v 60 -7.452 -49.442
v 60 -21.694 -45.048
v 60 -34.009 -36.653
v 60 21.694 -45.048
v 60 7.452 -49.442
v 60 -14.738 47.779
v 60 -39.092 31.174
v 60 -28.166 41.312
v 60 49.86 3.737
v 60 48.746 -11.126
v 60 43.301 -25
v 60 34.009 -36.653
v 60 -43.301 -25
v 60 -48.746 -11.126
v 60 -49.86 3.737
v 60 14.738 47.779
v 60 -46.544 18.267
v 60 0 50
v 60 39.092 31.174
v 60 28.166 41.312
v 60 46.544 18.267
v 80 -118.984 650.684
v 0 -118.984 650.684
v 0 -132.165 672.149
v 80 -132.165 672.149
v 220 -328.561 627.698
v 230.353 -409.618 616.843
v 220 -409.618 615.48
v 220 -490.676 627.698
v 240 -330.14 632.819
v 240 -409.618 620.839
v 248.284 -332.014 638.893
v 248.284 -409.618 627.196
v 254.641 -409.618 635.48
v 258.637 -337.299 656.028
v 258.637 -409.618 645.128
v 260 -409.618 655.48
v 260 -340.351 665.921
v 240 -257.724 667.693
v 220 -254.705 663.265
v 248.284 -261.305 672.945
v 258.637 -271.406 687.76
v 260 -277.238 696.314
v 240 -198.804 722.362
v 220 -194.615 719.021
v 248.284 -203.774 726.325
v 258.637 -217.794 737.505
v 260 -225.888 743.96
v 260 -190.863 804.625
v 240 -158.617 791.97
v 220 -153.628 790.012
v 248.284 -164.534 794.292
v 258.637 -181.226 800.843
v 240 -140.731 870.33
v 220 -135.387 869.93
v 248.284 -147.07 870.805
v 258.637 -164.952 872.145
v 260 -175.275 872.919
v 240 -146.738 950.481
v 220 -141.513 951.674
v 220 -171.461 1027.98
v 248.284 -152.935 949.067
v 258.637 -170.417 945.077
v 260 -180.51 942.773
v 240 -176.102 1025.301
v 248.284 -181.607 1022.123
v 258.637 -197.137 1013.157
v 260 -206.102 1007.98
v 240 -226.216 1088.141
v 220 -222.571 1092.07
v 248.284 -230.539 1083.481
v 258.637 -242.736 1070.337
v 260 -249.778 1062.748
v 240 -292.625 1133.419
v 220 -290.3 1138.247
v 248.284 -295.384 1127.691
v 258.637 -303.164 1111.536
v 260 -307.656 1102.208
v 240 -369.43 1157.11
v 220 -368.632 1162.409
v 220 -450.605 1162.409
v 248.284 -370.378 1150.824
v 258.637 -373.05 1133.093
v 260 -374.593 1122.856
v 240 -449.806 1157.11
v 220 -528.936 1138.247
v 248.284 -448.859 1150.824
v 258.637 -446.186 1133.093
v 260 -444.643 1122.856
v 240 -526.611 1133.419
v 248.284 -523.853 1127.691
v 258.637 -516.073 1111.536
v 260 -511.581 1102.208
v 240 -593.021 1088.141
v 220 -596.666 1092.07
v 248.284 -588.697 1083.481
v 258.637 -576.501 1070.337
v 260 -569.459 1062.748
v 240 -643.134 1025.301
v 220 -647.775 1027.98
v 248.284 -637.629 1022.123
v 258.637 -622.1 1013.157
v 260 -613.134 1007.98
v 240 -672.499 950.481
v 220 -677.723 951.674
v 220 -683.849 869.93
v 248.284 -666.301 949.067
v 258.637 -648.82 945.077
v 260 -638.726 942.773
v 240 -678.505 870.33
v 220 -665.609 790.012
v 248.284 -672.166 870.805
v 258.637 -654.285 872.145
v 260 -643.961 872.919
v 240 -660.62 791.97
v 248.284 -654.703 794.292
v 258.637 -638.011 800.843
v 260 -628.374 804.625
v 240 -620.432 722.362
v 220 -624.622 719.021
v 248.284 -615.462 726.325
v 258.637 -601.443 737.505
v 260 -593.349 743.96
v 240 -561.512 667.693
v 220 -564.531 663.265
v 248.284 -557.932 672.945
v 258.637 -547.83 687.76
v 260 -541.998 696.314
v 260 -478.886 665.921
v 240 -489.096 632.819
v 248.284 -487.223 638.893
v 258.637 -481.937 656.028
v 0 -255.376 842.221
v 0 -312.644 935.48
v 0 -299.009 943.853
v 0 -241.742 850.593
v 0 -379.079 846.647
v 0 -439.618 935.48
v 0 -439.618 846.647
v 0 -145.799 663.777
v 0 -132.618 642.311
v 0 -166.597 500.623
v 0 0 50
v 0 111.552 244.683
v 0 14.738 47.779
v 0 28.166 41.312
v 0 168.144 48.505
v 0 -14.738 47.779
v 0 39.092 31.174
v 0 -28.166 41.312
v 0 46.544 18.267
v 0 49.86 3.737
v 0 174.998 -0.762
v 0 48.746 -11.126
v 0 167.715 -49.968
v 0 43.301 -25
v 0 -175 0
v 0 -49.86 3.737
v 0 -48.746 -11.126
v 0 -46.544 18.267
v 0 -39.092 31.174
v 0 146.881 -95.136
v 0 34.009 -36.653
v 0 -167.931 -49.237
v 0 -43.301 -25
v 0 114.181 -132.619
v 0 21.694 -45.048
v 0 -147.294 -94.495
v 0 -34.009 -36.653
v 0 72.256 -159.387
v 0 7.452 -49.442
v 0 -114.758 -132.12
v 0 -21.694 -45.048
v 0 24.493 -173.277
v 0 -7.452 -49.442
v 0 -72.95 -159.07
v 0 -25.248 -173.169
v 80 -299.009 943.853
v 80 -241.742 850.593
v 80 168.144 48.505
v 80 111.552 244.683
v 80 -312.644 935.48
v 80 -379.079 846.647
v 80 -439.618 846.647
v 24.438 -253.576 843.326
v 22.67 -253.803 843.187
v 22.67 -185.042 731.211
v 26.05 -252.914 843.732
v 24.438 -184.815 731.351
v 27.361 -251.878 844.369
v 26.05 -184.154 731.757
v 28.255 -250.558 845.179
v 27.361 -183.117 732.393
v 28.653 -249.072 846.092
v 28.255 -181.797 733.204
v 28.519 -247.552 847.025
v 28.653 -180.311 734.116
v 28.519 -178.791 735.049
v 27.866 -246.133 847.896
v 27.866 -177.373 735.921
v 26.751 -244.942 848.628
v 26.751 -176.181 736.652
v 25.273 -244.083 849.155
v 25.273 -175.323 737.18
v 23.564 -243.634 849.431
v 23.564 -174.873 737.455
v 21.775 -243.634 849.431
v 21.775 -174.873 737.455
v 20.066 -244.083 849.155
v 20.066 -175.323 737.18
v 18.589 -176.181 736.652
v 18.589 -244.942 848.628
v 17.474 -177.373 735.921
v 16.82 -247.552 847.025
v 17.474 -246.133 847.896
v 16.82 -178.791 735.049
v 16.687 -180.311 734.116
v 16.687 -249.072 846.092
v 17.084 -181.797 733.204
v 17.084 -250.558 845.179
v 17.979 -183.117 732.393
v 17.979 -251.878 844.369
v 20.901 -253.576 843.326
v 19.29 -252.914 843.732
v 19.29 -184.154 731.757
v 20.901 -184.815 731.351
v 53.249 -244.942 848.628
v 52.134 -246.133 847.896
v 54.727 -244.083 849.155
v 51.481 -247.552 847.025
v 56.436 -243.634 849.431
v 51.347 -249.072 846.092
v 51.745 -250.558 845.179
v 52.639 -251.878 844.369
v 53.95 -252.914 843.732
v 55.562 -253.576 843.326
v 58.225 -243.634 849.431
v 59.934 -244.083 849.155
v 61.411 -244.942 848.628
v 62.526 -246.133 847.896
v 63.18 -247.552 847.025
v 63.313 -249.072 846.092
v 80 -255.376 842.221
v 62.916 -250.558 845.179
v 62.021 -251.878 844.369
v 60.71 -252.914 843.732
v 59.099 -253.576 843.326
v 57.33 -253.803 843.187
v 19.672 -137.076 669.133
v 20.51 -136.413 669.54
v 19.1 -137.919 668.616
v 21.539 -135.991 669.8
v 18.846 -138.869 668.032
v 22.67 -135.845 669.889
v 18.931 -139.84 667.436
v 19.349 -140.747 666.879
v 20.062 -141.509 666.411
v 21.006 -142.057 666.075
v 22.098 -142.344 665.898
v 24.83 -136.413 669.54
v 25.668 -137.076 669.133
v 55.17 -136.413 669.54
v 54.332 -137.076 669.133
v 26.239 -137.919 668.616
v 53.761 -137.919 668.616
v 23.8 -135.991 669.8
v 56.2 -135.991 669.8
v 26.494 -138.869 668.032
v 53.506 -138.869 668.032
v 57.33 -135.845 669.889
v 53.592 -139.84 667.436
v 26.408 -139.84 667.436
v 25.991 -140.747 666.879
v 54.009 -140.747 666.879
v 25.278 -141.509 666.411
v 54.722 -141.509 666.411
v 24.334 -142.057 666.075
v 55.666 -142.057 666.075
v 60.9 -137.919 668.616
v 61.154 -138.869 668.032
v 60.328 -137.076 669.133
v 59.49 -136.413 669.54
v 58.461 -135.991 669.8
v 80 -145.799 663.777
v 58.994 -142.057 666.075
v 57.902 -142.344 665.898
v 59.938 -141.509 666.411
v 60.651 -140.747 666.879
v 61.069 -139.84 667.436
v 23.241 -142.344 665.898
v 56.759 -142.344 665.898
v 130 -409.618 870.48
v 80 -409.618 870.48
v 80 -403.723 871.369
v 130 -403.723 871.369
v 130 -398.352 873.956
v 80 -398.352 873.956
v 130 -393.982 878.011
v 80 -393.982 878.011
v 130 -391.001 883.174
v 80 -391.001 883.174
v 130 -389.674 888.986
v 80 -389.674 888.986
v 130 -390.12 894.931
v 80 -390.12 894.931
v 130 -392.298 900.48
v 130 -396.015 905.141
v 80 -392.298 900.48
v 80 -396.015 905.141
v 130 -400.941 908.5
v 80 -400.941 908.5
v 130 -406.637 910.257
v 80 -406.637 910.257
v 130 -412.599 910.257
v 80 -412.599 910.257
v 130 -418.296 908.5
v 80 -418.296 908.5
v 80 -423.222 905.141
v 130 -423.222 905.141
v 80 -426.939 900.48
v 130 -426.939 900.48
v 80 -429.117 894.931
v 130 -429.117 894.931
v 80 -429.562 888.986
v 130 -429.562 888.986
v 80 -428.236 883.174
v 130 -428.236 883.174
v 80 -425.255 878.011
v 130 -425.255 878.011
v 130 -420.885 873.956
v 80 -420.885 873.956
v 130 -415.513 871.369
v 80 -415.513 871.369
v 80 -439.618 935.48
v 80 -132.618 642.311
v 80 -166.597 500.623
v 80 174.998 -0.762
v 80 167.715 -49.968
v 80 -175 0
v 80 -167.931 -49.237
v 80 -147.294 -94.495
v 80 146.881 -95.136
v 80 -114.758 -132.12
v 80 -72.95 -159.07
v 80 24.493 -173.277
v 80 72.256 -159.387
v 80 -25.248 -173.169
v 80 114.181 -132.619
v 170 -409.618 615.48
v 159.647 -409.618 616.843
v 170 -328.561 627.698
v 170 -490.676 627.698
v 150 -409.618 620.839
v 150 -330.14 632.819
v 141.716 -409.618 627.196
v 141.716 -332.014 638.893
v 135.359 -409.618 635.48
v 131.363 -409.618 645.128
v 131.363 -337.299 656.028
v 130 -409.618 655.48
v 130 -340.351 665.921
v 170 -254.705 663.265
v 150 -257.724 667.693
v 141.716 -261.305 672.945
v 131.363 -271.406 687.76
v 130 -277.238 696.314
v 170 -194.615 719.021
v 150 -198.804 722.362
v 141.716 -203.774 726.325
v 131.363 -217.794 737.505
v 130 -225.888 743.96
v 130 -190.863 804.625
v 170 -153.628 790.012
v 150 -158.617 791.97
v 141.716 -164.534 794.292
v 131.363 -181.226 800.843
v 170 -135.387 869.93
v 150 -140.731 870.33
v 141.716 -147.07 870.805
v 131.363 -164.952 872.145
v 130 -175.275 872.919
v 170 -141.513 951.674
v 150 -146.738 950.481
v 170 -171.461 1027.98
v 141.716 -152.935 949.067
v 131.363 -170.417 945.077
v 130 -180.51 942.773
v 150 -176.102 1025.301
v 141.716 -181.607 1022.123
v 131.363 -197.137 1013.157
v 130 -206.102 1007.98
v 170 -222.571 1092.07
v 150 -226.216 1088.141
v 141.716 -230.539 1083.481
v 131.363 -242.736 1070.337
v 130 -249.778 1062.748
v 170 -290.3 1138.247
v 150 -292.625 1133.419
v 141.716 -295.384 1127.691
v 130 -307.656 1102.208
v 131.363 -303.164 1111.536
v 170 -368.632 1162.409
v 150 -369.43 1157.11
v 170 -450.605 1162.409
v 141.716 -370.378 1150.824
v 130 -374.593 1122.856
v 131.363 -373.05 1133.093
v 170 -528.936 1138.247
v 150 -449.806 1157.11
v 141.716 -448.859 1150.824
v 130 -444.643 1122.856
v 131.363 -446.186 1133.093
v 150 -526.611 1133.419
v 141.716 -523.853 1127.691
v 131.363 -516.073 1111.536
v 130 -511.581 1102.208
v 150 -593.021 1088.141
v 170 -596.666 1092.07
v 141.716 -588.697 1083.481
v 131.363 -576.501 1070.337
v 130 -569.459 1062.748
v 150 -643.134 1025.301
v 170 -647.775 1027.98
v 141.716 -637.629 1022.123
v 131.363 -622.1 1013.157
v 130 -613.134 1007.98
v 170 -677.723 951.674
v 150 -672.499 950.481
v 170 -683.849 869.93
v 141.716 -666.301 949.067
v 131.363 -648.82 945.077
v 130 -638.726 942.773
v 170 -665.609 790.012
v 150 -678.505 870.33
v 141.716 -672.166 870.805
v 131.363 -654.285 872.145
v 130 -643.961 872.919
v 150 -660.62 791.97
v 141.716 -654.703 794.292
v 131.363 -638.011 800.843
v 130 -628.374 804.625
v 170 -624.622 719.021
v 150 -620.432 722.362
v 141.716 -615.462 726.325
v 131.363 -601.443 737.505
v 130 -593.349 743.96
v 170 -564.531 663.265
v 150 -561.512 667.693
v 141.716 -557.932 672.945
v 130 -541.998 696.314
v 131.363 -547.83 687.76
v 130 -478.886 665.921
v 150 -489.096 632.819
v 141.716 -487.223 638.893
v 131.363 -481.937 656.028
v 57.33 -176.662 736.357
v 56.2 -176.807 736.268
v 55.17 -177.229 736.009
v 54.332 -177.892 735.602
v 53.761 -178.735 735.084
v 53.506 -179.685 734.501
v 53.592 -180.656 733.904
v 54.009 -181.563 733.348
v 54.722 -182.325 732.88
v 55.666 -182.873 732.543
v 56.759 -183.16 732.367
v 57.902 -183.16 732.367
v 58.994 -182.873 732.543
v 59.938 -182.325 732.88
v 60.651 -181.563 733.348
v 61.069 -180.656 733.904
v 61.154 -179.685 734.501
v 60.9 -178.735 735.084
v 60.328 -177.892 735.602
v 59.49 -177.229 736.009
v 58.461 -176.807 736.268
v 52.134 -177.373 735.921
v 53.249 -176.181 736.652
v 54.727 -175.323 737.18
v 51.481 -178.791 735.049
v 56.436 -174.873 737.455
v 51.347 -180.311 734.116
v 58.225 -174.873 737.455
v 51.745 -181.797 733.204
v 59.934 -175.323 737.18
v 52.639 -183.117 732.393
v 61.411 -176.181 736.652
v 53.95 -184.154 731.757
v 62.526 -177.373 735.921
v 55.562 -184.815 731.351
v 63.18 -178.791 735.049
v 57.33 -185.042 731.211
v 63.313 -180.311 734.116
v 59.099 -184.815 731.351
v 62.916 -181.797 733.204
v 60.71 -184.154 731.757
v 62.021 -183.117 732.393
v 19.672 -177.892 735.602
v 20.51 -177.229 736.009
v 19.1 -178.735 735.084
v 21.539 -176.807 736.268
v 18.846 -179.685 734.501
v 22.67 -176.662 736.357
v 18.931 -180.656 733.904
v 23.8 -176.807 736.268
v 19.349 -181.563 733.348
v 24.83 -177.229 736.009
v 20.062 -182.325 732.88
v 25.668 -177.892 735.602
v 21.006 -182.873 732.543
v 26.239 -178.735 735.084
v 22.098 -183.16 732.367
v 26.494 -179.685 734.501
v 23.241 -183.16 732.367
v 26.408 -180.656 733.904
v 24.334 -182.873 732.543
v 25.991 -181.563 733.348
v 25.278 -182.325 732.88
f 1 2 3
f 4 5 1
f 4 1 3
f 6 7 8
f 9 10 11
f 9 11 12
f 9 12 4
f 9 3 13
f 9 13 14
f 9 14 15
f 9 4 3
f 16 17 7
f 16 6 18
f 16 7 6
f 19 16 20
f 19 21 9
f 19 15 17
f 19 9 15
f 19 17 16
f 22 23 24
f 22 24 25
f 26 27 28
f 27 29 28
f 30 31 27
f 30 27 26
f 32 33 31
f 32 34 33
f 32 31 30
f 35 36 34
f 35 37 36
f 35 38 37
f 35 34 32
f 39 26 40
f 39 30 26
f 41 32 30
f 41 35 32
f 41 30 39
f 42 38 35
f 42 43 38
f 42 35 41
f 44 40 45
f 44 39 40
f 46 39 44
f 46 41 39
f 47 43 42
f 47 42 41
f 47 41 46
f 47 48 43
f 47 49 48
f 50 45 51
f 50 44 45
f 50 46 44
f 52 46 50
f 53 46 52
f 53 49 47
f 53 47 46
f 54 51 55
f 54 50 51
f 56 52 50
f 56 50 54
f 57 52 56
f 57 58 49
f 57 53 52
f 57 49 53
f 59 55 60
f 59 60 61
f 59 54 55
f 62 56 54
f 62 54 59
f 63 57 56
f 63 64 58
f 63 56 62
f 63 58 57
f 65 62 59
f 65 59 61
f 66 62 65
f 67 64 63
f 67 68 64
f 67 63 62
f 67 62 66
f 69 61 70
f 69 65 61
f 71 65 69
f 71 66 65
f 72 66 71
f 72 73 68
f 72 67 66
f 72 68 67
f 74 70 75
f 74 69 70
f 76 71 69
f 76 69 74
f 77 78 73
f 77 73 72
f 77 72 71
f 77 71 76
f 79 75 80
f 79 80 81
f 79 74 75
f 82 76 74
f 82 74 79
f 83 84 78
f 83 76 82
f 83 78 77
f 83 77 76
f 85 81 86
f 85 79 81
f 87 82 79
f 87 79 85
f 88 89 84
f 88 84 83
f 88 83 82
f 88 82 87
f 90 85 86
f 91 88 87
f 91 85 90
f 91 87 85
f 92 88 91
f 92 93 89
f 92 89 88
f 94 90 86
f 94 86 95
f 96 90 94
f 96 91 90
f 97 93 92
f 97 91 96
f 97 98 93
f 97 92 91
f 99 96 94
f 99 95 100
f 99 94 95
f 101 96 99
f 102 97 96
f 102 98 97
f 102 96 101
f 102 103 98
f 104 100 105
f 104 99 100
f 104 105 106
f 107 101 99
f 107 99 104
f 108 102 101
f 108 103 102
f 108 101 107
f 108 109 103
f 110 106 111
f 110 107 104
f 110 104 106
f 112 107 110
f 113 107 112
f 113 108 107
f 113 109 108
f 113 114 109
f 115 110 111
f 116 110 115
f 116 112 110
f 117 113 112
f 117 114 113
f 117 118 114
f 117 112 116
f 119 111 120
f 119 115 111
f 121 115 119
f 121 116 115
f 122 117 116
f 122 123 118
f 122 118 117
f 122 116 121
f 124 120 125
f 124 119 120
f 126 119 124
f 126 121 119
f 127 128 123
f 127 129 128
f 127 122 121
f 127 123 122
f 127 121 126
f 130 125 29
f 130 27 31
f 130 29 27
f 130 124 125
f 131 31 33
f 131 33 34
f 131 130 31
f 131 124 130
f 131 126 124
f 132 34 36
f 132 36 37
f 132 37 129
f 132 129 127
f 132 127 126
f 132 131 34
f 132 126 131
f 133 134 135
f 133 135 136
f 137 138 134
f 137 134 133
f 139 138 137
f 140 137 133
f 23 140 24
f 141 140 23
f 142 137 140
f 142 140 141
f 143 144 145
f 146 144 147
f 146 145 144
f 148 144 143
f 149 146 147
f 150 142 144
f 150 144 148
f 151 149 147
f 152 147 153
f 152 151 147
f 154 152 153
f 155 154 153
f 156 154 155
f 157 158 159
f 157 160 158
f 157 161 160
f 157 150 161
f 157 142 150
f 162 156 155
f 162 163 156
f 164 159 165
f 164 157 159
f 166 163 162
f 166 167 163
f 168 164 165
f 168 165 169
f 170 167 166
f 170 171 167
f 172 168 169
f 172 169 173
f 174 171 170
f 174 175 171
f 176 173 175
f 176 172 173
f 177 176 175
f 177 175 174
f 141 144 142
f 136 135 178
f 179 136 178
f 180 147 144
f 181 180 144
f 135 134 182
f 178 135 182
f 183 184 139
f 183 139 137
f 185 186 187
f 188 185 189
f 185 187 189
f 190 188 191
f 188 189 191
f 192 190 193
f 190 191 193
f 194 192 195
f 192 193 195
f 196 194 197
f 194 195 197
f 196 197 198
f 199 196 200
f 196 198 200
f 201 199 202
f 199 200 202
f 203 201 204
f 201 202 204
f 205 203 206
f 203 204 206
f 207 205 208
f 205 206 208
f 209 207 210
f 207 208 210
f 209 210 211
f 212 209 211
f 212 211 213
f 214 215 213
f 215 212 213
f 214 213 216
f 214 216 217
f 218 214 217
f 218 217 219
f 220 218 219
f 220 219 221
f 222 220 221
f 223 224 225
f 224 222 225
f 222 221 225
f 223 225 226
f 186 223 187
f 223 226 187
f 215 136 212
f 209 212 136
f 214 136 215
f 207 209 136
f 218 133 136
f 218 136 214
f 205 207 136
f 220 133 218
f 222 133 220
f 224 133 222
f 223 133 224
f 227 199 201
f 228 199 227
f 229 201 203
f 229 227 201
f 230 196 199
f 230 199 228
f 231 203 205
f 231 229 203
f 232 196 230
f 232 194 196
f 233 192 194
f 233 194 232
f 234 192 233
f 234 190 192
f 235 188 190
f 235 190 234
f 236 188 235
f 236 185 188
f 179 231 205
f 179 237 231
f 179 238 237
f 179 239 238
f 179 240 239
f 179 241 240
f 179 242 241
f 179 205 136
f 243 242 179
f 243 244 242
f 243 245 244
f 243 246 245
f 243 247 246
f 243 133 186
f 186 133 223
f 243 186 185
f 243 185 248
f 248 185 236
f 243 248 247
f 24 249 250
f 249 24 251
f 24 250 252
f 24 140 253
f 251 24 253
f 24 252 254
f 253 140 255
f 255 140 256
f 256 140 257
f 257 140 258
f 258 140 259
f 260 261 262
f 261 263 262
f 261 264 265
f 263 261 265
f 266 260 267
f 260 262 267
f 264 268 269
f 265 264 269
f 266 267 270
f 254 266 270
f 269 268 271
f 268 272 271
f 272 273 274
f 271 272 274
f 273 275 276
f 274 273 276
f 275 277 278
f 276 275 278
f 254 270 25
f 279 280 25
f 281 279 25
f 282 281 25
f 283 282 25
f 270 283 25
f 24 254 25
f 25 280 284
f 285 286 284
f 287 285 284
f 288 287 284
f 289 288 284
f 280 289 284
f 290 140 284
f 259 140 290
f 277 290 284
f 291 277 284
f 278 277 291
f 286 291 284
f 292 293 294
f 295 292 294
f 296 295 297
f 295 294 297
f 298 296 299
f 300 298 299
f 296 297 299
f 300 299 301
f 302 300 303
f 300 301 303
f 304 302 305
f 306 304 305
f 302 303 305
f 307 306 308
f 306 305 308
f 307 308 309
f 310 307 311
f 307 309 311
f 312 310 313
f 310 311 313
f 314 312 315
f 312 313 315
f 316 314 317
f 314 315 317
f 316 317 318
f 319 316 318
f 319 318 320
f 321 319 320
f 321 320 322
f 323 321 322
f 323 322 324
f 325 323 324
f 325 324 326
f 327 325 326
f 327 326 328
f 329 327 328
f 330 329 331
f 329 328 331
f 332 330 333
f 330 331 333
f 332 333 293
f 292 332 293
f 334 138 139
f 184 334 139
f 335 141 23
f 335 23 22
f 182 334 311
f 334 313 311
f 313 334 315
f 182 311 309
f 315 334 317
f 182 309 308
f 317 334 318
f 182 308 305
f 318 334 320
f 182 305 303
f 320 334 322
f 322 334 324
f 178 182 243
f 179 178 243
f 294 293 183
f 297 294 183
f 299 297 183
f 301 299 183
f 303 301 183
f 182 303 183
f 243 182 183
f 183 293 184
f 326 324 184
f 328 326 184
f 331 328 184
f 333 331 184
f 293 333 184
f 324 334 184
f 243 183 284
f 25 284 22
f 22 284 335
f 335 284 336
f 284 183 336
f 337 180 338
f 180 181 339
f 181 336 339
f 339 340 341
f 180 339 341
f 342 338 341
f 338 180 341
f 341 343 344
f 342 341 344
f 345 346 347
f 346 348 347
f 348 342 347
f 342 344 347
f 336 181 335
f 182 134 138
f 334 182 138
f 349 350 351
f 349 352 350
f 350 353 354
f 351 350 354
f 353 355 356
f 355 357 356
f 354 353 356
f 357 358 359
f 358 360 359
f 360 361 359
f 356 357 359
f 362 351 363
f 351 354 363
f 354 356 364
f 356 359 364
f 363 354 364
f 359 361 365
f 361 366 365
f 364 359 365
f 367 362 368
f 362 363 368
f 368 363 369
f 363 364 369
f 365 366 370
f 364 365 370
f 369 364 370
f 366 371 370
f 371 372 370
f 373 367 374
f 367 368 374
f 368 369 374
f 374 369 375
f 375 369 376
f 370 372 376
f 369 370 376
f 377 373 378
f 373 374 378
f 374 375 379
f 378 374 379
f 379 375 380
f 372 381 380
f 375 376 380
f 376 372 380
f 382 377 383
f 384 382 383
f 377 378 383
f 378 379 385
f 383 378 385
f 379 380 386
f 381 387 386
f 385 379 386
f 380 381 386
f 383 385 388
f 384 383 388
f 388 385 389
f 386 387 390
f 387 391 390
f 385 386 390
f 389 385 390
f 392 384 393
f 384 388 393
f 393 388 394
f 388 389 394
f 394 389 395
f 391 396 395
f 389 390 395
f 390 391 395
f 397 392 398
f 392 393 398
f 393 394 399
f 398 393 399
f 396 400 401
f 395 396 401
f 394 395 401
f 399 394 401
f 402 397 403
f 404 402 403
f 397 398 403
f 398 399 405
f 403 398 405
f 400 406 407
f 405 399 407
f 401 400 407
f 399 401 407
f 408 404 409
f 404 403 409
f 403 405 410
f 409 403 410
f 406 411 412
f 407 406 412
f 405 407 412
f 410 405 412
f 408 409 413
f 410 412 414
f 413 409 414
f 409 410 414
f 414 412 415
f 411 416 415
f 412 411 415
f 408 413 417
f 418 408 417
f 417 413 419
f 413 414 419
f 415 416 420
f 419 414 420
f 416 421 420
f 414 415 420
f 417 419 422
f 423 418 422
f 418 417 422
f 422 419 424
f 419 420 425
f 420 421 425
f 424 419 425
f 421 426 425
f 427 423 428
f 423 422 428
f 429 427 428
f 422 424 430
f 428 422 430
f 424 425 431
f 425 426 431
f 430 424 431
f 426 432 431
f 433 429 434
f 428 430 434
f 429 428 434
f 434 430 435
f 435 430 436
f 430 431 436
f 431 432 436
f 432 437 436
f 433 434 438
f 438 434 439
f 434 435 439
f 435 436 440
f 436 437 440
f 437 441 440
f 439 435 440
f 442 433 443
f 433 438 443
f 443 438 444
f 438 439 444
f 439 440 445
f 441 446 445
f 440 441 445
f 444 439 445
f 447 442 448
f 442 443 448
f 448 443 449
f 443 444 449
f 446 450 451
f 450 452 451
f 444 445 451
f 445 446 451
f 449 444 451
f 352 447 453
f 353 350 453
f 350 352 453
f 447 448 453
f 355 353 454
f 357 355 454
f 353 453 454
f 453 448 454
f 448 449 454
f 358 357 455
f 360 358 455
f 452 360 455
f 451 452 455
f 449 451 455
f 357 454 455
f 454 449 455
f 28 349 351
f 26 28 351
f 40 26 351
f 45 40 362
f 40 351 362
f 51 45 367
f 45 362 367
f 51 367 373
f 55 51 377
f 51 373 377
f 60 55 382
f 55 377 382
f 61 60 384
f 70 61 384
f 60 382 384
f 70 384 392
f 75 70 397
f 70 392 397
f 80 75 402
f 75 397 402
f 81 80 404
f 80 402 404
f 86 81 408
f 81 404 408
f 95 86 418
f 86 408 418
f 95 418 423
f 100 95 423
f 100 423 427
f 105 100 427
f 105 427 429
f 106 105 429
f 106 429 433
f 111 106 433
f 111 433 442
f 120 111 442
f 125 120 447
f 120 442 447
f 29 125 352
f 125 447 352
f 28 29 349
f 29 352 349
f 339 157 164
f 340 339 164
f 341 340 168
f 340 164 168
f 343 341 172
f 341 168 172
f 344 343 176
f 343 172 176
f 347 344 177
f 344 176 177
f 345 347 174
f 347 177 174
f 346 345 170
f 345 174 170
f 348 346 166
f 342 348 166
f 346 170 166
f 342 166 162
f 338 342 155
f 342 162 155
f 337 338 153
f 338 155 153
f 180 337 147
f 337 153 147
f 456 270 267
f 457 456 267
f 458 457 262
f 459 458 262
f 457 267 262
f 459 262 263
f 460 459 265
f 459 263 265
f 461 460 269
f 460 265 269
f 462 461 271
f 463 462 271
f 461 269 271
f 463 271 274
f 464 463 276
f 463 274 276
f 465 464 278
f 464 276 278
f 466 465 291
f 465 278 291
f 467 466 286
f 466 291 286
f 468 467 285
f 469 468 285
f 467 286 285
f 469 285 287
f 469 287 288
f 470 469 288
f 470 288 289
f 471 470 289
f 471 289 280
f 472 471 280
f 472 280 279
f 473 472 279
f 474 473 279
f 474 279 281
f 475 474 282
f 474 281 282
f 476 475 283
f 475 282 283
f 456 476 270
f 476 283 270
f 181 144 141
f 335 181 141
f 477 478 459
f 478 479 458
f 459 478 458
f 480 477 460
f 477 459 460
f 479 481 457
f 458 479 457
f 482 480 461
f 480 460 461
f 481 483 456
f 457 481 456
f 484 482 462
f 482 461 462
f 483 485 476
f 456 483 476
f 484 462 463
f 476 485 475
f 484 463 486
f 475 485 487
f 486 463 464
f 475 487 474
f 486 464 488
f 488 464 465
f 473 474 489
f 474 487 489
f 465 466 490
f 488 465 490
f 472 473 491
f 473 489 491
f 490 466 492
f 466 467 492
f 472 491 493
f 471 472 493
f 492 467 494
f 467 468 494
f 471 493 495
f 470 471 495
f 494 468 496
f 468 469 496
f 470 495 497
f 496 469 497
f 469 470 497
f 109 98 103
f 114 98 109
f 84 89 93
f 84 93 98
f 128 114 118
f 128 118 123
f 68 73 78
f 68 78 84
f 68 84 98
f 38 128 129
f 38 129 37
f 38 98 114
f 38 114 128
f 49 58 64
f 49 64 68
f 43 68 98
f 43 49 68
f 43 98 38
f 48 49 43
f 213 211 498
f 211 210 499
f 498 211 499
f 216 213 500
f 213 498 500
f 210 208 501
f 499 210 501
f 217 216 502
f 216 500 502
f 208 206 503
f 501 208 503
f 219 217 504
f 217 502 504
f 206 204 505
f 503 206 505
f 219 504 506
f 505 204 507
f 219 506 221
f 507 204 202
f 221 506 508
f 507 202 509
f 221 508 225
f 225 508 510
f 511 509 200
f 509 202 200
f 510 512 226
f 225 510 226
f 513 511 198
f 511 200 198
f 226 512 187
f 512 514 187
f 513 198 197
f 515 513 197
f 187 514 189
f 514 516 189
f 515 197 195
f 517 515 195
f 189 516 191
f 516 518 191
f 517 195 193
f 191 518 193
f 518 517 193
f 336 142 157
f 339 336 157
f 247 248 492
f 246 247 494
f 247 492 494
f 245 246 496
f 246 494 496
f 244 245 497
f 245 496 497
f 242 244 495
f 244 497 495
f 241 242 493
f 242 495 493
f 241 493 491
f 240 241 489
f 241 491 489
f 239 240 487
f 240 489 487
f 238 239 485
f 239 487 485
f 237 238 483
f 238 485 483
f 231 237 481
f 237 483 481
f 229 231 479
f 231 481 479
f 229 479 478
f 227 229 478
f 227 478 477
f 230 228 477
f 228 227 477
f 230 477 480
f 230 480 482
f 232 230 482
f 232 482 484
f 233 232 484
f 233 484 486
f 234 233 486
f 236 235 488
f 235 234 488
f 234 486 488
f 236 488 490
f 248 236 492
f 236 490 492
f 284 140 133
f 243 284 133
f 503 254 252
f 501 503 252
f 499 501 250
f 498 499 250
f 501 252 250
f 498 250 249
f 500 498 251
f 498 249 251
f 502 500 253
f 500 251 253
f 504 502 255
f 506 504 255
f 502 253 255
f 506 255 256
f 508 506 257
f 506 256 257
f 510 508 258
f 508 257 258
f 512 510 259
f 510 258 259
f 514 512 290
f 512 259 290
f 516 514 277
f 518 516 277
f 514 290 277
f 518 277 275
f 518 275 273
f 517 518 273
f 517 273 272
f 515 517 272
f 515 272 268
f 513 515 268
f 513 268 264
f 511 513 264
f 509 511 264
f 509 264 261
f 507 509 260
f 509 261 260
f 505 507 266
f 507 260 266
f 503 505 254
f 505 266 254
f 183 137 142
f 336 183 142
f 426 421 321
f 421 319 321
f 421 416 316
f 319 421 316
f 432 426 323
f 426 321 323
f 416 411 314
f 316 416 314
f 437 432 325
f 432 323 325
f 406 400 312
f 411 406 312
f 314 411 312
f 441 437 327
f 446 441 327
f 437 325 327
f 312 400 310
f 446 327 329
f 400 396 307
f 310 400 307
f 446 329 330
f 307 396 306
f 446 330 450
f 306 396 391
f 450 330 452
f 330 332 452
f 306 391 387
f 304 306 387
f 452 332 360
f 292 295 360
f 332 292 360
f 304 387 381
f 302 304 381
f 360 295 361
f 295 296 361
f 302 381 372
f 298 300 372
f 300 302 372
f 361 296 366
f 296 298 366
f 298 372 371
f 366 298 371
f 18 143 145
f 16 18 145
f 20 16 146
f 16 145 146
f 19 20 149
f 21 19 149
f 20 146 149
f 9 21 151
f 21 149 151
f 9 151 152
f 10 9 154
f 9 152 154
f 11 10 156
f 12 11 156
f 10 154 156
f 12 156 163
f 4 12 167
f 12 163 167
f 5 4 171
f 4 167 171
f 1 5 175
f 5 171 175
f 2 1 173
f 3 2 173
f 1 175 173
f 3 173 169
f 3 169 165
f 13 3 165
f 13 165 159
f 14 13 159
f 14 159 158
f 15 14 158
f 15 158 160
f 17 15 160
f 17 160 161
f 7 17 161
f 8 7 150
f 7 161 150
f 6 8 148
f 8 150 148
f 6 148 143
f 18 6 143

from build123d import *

# Parameters (mm, degrees)
BOSS_EXTRUDE1_DEPTH = 80
SKETCH3_R           = 50
CUT_EXTRUDE1_DEPTH  = 60
SKETCH4_W           = 80
SKETCH4_H           = 25.189285717
BOSS_EXTRUDE2_DEPTH = 16
SKETCH5_W           = 80
SKETCH5_H           = 109.43946138
BOSS_EXTRUDE3_DEPTH = 16
SKETCH6_R           = 3.834610425
BOSS_EXTRUDE4_DEPTH = 78
SKETCH7_R           = 6
BOSS_EXTRUDE5_DEPTH = 135
SKETCH9_R           = 20
BOSS_EXTRUDE6_DEPTH = 50
SKETCH10_R          = 275
BOSS_EXTRUDE7_DEPTH = 130
FILLET1_R           = 40


with BuildPart() as part:
    # Sketch1 → Boss-Extrude1 (new body)
    with BuildSketch(Plane(origin=(0, 0, 0), x_dir=(0, 0, -1), z_dir=(1, 0, 0))):
        with BuildLine():
            Line((-48.50457236, 168.143707763), (-244.683369844, 111.551826897))
            Line((-244.683369844, 111.551826897), (-935.480433622, -312.64385861))
            Line((-935.480433622, -312.64385861), (-935.480433622, -439.618269219))
            Line((-935.480433622, -439.618269219), (-846.646989911, -439.618269219))
            Line((-846.646989911, -439.618269219), (-846.646989911, -379.079220955))
            Line((-846.646989911, -379.079220955), (-500.622904168, -166.597246219))
            Line((-500.622904168, -166.597246219), (0, -175))
            ThreePointArc((0, -175), (173.277449281, 24.4933781), (-48.50457236, 168.143707763))
        make_face()
    extrude(amount=BOSS_EXTRUDE1_DEPTH)

    # Sketch3 → Cut-Extrude1 (cut)
    with BuildSketch(Plane.ZY):
        Circle(SKETCH3_R)
    extrude(amount=-CUT_EXTRUDE1_DEPTH, mode=Mode.SUBTRACT)

    # Sketch4 → Boss-Extrude2 (add)
    with BuildSketch(Plane(origin=(0, 190.115415773, 116.743604378), x_dir=(1, 0, 0), z_dir=(0, 0.8521590965506677, 0.5232827860401581))):
        with Locations((40, -629.342954153)):
            Rectangle(SKETCH4_W, SKETCH4_H)
    extrude(amount=BOSS_EXTRUDE2_DEPTH)

    # Sketch5 → Boss-Extrude3 (add)
    with BuildSketch(Plane(origin=(0, 190.115415773, 116.743604378), x_dir=(1, 0, 0), z_dir=(0, 0.8521590965506677, 0.5232827860401581))):
        with Locations((40, -906.059579837)):
            Rectangle(SKETCH5_W, SKETCH5_H)
    extrude(amount=BOSS_EXTRUDE3_DEPTH)

    # Sketch6 → Boss-Extrude4 (add)
    with BuildSketch(Plane(origin=(0, -335.914894228, 547.032962711), x_dir=(1, 0, 0), z_dir=(0, -0.5232827860401581, 0.8521590965506677))):
        with Locations(Location((22.669741736, 230.944821583, 0), (0, 0, 90))):
            Circle(SKETCH6_R)
        with Locations(Location((57.330258264, 230.944821583, 0), (0, 0, 90))):
            Circle(SKETCH6_R)
    extrude(amount=BOSS_EXTRUDE4_DEPTH)

    # Sketch7 → Boss-Extrude5 (add)
    with BuildSketch(Plane(origin=(0, -376.730951539, 613.501372242), x_dir=(1, 0, 0), z_dir=(0, -0.5232827860401581, 0.8521590965506677))):
        with Locations(Location((22.669741736, 230.944821583, 0), (0, 0, 270))):
            Circle(SKETCH7_R)
        with Locations(Location((57.330258264, 230.944821583, 0), (0, 0, 270))):
            Circle(SKETCH7_R)
    extrude(amount=BOSS_EXTRUDE5_DEPTH)

    # Sketch9 → Boss-Extrude6 (add)
    with BuildSketch(Plane(origin=(80, 0, 0), x_dir=(0, 0, -1), z_dir=(1, 0, 0))):
        with Locations((-890.480433622, -409.618269219)):
            Circle(SKETCH9_R)
    extrude(amount=BOSS_EXTRUDE6_DEPTH)

    # Sketch10 → Boss-Extrude7 (add)
    with BuildSketch(Plane(origin=(130, 0, 0), x_dir=(0, 0, -1), z_dir=(1, 0, 0))):
        with Locations((-890.480433622, -409.618269219)):
            Circle(SKETCH10_R)
    extrude(amount=BOSS_EXTRUDE7_DEPTH)

    # Fillet1
    fillet1_edges = [part.edges().sort_by_distance(p)[0] for p in [
        (130, -409.618269219, 1165.480433622),
        (260, -409.618269219, 1165.480433622),
    ]]
    fillet(fillet1_edges, radius=FILLET1_R)


solid = part.part
